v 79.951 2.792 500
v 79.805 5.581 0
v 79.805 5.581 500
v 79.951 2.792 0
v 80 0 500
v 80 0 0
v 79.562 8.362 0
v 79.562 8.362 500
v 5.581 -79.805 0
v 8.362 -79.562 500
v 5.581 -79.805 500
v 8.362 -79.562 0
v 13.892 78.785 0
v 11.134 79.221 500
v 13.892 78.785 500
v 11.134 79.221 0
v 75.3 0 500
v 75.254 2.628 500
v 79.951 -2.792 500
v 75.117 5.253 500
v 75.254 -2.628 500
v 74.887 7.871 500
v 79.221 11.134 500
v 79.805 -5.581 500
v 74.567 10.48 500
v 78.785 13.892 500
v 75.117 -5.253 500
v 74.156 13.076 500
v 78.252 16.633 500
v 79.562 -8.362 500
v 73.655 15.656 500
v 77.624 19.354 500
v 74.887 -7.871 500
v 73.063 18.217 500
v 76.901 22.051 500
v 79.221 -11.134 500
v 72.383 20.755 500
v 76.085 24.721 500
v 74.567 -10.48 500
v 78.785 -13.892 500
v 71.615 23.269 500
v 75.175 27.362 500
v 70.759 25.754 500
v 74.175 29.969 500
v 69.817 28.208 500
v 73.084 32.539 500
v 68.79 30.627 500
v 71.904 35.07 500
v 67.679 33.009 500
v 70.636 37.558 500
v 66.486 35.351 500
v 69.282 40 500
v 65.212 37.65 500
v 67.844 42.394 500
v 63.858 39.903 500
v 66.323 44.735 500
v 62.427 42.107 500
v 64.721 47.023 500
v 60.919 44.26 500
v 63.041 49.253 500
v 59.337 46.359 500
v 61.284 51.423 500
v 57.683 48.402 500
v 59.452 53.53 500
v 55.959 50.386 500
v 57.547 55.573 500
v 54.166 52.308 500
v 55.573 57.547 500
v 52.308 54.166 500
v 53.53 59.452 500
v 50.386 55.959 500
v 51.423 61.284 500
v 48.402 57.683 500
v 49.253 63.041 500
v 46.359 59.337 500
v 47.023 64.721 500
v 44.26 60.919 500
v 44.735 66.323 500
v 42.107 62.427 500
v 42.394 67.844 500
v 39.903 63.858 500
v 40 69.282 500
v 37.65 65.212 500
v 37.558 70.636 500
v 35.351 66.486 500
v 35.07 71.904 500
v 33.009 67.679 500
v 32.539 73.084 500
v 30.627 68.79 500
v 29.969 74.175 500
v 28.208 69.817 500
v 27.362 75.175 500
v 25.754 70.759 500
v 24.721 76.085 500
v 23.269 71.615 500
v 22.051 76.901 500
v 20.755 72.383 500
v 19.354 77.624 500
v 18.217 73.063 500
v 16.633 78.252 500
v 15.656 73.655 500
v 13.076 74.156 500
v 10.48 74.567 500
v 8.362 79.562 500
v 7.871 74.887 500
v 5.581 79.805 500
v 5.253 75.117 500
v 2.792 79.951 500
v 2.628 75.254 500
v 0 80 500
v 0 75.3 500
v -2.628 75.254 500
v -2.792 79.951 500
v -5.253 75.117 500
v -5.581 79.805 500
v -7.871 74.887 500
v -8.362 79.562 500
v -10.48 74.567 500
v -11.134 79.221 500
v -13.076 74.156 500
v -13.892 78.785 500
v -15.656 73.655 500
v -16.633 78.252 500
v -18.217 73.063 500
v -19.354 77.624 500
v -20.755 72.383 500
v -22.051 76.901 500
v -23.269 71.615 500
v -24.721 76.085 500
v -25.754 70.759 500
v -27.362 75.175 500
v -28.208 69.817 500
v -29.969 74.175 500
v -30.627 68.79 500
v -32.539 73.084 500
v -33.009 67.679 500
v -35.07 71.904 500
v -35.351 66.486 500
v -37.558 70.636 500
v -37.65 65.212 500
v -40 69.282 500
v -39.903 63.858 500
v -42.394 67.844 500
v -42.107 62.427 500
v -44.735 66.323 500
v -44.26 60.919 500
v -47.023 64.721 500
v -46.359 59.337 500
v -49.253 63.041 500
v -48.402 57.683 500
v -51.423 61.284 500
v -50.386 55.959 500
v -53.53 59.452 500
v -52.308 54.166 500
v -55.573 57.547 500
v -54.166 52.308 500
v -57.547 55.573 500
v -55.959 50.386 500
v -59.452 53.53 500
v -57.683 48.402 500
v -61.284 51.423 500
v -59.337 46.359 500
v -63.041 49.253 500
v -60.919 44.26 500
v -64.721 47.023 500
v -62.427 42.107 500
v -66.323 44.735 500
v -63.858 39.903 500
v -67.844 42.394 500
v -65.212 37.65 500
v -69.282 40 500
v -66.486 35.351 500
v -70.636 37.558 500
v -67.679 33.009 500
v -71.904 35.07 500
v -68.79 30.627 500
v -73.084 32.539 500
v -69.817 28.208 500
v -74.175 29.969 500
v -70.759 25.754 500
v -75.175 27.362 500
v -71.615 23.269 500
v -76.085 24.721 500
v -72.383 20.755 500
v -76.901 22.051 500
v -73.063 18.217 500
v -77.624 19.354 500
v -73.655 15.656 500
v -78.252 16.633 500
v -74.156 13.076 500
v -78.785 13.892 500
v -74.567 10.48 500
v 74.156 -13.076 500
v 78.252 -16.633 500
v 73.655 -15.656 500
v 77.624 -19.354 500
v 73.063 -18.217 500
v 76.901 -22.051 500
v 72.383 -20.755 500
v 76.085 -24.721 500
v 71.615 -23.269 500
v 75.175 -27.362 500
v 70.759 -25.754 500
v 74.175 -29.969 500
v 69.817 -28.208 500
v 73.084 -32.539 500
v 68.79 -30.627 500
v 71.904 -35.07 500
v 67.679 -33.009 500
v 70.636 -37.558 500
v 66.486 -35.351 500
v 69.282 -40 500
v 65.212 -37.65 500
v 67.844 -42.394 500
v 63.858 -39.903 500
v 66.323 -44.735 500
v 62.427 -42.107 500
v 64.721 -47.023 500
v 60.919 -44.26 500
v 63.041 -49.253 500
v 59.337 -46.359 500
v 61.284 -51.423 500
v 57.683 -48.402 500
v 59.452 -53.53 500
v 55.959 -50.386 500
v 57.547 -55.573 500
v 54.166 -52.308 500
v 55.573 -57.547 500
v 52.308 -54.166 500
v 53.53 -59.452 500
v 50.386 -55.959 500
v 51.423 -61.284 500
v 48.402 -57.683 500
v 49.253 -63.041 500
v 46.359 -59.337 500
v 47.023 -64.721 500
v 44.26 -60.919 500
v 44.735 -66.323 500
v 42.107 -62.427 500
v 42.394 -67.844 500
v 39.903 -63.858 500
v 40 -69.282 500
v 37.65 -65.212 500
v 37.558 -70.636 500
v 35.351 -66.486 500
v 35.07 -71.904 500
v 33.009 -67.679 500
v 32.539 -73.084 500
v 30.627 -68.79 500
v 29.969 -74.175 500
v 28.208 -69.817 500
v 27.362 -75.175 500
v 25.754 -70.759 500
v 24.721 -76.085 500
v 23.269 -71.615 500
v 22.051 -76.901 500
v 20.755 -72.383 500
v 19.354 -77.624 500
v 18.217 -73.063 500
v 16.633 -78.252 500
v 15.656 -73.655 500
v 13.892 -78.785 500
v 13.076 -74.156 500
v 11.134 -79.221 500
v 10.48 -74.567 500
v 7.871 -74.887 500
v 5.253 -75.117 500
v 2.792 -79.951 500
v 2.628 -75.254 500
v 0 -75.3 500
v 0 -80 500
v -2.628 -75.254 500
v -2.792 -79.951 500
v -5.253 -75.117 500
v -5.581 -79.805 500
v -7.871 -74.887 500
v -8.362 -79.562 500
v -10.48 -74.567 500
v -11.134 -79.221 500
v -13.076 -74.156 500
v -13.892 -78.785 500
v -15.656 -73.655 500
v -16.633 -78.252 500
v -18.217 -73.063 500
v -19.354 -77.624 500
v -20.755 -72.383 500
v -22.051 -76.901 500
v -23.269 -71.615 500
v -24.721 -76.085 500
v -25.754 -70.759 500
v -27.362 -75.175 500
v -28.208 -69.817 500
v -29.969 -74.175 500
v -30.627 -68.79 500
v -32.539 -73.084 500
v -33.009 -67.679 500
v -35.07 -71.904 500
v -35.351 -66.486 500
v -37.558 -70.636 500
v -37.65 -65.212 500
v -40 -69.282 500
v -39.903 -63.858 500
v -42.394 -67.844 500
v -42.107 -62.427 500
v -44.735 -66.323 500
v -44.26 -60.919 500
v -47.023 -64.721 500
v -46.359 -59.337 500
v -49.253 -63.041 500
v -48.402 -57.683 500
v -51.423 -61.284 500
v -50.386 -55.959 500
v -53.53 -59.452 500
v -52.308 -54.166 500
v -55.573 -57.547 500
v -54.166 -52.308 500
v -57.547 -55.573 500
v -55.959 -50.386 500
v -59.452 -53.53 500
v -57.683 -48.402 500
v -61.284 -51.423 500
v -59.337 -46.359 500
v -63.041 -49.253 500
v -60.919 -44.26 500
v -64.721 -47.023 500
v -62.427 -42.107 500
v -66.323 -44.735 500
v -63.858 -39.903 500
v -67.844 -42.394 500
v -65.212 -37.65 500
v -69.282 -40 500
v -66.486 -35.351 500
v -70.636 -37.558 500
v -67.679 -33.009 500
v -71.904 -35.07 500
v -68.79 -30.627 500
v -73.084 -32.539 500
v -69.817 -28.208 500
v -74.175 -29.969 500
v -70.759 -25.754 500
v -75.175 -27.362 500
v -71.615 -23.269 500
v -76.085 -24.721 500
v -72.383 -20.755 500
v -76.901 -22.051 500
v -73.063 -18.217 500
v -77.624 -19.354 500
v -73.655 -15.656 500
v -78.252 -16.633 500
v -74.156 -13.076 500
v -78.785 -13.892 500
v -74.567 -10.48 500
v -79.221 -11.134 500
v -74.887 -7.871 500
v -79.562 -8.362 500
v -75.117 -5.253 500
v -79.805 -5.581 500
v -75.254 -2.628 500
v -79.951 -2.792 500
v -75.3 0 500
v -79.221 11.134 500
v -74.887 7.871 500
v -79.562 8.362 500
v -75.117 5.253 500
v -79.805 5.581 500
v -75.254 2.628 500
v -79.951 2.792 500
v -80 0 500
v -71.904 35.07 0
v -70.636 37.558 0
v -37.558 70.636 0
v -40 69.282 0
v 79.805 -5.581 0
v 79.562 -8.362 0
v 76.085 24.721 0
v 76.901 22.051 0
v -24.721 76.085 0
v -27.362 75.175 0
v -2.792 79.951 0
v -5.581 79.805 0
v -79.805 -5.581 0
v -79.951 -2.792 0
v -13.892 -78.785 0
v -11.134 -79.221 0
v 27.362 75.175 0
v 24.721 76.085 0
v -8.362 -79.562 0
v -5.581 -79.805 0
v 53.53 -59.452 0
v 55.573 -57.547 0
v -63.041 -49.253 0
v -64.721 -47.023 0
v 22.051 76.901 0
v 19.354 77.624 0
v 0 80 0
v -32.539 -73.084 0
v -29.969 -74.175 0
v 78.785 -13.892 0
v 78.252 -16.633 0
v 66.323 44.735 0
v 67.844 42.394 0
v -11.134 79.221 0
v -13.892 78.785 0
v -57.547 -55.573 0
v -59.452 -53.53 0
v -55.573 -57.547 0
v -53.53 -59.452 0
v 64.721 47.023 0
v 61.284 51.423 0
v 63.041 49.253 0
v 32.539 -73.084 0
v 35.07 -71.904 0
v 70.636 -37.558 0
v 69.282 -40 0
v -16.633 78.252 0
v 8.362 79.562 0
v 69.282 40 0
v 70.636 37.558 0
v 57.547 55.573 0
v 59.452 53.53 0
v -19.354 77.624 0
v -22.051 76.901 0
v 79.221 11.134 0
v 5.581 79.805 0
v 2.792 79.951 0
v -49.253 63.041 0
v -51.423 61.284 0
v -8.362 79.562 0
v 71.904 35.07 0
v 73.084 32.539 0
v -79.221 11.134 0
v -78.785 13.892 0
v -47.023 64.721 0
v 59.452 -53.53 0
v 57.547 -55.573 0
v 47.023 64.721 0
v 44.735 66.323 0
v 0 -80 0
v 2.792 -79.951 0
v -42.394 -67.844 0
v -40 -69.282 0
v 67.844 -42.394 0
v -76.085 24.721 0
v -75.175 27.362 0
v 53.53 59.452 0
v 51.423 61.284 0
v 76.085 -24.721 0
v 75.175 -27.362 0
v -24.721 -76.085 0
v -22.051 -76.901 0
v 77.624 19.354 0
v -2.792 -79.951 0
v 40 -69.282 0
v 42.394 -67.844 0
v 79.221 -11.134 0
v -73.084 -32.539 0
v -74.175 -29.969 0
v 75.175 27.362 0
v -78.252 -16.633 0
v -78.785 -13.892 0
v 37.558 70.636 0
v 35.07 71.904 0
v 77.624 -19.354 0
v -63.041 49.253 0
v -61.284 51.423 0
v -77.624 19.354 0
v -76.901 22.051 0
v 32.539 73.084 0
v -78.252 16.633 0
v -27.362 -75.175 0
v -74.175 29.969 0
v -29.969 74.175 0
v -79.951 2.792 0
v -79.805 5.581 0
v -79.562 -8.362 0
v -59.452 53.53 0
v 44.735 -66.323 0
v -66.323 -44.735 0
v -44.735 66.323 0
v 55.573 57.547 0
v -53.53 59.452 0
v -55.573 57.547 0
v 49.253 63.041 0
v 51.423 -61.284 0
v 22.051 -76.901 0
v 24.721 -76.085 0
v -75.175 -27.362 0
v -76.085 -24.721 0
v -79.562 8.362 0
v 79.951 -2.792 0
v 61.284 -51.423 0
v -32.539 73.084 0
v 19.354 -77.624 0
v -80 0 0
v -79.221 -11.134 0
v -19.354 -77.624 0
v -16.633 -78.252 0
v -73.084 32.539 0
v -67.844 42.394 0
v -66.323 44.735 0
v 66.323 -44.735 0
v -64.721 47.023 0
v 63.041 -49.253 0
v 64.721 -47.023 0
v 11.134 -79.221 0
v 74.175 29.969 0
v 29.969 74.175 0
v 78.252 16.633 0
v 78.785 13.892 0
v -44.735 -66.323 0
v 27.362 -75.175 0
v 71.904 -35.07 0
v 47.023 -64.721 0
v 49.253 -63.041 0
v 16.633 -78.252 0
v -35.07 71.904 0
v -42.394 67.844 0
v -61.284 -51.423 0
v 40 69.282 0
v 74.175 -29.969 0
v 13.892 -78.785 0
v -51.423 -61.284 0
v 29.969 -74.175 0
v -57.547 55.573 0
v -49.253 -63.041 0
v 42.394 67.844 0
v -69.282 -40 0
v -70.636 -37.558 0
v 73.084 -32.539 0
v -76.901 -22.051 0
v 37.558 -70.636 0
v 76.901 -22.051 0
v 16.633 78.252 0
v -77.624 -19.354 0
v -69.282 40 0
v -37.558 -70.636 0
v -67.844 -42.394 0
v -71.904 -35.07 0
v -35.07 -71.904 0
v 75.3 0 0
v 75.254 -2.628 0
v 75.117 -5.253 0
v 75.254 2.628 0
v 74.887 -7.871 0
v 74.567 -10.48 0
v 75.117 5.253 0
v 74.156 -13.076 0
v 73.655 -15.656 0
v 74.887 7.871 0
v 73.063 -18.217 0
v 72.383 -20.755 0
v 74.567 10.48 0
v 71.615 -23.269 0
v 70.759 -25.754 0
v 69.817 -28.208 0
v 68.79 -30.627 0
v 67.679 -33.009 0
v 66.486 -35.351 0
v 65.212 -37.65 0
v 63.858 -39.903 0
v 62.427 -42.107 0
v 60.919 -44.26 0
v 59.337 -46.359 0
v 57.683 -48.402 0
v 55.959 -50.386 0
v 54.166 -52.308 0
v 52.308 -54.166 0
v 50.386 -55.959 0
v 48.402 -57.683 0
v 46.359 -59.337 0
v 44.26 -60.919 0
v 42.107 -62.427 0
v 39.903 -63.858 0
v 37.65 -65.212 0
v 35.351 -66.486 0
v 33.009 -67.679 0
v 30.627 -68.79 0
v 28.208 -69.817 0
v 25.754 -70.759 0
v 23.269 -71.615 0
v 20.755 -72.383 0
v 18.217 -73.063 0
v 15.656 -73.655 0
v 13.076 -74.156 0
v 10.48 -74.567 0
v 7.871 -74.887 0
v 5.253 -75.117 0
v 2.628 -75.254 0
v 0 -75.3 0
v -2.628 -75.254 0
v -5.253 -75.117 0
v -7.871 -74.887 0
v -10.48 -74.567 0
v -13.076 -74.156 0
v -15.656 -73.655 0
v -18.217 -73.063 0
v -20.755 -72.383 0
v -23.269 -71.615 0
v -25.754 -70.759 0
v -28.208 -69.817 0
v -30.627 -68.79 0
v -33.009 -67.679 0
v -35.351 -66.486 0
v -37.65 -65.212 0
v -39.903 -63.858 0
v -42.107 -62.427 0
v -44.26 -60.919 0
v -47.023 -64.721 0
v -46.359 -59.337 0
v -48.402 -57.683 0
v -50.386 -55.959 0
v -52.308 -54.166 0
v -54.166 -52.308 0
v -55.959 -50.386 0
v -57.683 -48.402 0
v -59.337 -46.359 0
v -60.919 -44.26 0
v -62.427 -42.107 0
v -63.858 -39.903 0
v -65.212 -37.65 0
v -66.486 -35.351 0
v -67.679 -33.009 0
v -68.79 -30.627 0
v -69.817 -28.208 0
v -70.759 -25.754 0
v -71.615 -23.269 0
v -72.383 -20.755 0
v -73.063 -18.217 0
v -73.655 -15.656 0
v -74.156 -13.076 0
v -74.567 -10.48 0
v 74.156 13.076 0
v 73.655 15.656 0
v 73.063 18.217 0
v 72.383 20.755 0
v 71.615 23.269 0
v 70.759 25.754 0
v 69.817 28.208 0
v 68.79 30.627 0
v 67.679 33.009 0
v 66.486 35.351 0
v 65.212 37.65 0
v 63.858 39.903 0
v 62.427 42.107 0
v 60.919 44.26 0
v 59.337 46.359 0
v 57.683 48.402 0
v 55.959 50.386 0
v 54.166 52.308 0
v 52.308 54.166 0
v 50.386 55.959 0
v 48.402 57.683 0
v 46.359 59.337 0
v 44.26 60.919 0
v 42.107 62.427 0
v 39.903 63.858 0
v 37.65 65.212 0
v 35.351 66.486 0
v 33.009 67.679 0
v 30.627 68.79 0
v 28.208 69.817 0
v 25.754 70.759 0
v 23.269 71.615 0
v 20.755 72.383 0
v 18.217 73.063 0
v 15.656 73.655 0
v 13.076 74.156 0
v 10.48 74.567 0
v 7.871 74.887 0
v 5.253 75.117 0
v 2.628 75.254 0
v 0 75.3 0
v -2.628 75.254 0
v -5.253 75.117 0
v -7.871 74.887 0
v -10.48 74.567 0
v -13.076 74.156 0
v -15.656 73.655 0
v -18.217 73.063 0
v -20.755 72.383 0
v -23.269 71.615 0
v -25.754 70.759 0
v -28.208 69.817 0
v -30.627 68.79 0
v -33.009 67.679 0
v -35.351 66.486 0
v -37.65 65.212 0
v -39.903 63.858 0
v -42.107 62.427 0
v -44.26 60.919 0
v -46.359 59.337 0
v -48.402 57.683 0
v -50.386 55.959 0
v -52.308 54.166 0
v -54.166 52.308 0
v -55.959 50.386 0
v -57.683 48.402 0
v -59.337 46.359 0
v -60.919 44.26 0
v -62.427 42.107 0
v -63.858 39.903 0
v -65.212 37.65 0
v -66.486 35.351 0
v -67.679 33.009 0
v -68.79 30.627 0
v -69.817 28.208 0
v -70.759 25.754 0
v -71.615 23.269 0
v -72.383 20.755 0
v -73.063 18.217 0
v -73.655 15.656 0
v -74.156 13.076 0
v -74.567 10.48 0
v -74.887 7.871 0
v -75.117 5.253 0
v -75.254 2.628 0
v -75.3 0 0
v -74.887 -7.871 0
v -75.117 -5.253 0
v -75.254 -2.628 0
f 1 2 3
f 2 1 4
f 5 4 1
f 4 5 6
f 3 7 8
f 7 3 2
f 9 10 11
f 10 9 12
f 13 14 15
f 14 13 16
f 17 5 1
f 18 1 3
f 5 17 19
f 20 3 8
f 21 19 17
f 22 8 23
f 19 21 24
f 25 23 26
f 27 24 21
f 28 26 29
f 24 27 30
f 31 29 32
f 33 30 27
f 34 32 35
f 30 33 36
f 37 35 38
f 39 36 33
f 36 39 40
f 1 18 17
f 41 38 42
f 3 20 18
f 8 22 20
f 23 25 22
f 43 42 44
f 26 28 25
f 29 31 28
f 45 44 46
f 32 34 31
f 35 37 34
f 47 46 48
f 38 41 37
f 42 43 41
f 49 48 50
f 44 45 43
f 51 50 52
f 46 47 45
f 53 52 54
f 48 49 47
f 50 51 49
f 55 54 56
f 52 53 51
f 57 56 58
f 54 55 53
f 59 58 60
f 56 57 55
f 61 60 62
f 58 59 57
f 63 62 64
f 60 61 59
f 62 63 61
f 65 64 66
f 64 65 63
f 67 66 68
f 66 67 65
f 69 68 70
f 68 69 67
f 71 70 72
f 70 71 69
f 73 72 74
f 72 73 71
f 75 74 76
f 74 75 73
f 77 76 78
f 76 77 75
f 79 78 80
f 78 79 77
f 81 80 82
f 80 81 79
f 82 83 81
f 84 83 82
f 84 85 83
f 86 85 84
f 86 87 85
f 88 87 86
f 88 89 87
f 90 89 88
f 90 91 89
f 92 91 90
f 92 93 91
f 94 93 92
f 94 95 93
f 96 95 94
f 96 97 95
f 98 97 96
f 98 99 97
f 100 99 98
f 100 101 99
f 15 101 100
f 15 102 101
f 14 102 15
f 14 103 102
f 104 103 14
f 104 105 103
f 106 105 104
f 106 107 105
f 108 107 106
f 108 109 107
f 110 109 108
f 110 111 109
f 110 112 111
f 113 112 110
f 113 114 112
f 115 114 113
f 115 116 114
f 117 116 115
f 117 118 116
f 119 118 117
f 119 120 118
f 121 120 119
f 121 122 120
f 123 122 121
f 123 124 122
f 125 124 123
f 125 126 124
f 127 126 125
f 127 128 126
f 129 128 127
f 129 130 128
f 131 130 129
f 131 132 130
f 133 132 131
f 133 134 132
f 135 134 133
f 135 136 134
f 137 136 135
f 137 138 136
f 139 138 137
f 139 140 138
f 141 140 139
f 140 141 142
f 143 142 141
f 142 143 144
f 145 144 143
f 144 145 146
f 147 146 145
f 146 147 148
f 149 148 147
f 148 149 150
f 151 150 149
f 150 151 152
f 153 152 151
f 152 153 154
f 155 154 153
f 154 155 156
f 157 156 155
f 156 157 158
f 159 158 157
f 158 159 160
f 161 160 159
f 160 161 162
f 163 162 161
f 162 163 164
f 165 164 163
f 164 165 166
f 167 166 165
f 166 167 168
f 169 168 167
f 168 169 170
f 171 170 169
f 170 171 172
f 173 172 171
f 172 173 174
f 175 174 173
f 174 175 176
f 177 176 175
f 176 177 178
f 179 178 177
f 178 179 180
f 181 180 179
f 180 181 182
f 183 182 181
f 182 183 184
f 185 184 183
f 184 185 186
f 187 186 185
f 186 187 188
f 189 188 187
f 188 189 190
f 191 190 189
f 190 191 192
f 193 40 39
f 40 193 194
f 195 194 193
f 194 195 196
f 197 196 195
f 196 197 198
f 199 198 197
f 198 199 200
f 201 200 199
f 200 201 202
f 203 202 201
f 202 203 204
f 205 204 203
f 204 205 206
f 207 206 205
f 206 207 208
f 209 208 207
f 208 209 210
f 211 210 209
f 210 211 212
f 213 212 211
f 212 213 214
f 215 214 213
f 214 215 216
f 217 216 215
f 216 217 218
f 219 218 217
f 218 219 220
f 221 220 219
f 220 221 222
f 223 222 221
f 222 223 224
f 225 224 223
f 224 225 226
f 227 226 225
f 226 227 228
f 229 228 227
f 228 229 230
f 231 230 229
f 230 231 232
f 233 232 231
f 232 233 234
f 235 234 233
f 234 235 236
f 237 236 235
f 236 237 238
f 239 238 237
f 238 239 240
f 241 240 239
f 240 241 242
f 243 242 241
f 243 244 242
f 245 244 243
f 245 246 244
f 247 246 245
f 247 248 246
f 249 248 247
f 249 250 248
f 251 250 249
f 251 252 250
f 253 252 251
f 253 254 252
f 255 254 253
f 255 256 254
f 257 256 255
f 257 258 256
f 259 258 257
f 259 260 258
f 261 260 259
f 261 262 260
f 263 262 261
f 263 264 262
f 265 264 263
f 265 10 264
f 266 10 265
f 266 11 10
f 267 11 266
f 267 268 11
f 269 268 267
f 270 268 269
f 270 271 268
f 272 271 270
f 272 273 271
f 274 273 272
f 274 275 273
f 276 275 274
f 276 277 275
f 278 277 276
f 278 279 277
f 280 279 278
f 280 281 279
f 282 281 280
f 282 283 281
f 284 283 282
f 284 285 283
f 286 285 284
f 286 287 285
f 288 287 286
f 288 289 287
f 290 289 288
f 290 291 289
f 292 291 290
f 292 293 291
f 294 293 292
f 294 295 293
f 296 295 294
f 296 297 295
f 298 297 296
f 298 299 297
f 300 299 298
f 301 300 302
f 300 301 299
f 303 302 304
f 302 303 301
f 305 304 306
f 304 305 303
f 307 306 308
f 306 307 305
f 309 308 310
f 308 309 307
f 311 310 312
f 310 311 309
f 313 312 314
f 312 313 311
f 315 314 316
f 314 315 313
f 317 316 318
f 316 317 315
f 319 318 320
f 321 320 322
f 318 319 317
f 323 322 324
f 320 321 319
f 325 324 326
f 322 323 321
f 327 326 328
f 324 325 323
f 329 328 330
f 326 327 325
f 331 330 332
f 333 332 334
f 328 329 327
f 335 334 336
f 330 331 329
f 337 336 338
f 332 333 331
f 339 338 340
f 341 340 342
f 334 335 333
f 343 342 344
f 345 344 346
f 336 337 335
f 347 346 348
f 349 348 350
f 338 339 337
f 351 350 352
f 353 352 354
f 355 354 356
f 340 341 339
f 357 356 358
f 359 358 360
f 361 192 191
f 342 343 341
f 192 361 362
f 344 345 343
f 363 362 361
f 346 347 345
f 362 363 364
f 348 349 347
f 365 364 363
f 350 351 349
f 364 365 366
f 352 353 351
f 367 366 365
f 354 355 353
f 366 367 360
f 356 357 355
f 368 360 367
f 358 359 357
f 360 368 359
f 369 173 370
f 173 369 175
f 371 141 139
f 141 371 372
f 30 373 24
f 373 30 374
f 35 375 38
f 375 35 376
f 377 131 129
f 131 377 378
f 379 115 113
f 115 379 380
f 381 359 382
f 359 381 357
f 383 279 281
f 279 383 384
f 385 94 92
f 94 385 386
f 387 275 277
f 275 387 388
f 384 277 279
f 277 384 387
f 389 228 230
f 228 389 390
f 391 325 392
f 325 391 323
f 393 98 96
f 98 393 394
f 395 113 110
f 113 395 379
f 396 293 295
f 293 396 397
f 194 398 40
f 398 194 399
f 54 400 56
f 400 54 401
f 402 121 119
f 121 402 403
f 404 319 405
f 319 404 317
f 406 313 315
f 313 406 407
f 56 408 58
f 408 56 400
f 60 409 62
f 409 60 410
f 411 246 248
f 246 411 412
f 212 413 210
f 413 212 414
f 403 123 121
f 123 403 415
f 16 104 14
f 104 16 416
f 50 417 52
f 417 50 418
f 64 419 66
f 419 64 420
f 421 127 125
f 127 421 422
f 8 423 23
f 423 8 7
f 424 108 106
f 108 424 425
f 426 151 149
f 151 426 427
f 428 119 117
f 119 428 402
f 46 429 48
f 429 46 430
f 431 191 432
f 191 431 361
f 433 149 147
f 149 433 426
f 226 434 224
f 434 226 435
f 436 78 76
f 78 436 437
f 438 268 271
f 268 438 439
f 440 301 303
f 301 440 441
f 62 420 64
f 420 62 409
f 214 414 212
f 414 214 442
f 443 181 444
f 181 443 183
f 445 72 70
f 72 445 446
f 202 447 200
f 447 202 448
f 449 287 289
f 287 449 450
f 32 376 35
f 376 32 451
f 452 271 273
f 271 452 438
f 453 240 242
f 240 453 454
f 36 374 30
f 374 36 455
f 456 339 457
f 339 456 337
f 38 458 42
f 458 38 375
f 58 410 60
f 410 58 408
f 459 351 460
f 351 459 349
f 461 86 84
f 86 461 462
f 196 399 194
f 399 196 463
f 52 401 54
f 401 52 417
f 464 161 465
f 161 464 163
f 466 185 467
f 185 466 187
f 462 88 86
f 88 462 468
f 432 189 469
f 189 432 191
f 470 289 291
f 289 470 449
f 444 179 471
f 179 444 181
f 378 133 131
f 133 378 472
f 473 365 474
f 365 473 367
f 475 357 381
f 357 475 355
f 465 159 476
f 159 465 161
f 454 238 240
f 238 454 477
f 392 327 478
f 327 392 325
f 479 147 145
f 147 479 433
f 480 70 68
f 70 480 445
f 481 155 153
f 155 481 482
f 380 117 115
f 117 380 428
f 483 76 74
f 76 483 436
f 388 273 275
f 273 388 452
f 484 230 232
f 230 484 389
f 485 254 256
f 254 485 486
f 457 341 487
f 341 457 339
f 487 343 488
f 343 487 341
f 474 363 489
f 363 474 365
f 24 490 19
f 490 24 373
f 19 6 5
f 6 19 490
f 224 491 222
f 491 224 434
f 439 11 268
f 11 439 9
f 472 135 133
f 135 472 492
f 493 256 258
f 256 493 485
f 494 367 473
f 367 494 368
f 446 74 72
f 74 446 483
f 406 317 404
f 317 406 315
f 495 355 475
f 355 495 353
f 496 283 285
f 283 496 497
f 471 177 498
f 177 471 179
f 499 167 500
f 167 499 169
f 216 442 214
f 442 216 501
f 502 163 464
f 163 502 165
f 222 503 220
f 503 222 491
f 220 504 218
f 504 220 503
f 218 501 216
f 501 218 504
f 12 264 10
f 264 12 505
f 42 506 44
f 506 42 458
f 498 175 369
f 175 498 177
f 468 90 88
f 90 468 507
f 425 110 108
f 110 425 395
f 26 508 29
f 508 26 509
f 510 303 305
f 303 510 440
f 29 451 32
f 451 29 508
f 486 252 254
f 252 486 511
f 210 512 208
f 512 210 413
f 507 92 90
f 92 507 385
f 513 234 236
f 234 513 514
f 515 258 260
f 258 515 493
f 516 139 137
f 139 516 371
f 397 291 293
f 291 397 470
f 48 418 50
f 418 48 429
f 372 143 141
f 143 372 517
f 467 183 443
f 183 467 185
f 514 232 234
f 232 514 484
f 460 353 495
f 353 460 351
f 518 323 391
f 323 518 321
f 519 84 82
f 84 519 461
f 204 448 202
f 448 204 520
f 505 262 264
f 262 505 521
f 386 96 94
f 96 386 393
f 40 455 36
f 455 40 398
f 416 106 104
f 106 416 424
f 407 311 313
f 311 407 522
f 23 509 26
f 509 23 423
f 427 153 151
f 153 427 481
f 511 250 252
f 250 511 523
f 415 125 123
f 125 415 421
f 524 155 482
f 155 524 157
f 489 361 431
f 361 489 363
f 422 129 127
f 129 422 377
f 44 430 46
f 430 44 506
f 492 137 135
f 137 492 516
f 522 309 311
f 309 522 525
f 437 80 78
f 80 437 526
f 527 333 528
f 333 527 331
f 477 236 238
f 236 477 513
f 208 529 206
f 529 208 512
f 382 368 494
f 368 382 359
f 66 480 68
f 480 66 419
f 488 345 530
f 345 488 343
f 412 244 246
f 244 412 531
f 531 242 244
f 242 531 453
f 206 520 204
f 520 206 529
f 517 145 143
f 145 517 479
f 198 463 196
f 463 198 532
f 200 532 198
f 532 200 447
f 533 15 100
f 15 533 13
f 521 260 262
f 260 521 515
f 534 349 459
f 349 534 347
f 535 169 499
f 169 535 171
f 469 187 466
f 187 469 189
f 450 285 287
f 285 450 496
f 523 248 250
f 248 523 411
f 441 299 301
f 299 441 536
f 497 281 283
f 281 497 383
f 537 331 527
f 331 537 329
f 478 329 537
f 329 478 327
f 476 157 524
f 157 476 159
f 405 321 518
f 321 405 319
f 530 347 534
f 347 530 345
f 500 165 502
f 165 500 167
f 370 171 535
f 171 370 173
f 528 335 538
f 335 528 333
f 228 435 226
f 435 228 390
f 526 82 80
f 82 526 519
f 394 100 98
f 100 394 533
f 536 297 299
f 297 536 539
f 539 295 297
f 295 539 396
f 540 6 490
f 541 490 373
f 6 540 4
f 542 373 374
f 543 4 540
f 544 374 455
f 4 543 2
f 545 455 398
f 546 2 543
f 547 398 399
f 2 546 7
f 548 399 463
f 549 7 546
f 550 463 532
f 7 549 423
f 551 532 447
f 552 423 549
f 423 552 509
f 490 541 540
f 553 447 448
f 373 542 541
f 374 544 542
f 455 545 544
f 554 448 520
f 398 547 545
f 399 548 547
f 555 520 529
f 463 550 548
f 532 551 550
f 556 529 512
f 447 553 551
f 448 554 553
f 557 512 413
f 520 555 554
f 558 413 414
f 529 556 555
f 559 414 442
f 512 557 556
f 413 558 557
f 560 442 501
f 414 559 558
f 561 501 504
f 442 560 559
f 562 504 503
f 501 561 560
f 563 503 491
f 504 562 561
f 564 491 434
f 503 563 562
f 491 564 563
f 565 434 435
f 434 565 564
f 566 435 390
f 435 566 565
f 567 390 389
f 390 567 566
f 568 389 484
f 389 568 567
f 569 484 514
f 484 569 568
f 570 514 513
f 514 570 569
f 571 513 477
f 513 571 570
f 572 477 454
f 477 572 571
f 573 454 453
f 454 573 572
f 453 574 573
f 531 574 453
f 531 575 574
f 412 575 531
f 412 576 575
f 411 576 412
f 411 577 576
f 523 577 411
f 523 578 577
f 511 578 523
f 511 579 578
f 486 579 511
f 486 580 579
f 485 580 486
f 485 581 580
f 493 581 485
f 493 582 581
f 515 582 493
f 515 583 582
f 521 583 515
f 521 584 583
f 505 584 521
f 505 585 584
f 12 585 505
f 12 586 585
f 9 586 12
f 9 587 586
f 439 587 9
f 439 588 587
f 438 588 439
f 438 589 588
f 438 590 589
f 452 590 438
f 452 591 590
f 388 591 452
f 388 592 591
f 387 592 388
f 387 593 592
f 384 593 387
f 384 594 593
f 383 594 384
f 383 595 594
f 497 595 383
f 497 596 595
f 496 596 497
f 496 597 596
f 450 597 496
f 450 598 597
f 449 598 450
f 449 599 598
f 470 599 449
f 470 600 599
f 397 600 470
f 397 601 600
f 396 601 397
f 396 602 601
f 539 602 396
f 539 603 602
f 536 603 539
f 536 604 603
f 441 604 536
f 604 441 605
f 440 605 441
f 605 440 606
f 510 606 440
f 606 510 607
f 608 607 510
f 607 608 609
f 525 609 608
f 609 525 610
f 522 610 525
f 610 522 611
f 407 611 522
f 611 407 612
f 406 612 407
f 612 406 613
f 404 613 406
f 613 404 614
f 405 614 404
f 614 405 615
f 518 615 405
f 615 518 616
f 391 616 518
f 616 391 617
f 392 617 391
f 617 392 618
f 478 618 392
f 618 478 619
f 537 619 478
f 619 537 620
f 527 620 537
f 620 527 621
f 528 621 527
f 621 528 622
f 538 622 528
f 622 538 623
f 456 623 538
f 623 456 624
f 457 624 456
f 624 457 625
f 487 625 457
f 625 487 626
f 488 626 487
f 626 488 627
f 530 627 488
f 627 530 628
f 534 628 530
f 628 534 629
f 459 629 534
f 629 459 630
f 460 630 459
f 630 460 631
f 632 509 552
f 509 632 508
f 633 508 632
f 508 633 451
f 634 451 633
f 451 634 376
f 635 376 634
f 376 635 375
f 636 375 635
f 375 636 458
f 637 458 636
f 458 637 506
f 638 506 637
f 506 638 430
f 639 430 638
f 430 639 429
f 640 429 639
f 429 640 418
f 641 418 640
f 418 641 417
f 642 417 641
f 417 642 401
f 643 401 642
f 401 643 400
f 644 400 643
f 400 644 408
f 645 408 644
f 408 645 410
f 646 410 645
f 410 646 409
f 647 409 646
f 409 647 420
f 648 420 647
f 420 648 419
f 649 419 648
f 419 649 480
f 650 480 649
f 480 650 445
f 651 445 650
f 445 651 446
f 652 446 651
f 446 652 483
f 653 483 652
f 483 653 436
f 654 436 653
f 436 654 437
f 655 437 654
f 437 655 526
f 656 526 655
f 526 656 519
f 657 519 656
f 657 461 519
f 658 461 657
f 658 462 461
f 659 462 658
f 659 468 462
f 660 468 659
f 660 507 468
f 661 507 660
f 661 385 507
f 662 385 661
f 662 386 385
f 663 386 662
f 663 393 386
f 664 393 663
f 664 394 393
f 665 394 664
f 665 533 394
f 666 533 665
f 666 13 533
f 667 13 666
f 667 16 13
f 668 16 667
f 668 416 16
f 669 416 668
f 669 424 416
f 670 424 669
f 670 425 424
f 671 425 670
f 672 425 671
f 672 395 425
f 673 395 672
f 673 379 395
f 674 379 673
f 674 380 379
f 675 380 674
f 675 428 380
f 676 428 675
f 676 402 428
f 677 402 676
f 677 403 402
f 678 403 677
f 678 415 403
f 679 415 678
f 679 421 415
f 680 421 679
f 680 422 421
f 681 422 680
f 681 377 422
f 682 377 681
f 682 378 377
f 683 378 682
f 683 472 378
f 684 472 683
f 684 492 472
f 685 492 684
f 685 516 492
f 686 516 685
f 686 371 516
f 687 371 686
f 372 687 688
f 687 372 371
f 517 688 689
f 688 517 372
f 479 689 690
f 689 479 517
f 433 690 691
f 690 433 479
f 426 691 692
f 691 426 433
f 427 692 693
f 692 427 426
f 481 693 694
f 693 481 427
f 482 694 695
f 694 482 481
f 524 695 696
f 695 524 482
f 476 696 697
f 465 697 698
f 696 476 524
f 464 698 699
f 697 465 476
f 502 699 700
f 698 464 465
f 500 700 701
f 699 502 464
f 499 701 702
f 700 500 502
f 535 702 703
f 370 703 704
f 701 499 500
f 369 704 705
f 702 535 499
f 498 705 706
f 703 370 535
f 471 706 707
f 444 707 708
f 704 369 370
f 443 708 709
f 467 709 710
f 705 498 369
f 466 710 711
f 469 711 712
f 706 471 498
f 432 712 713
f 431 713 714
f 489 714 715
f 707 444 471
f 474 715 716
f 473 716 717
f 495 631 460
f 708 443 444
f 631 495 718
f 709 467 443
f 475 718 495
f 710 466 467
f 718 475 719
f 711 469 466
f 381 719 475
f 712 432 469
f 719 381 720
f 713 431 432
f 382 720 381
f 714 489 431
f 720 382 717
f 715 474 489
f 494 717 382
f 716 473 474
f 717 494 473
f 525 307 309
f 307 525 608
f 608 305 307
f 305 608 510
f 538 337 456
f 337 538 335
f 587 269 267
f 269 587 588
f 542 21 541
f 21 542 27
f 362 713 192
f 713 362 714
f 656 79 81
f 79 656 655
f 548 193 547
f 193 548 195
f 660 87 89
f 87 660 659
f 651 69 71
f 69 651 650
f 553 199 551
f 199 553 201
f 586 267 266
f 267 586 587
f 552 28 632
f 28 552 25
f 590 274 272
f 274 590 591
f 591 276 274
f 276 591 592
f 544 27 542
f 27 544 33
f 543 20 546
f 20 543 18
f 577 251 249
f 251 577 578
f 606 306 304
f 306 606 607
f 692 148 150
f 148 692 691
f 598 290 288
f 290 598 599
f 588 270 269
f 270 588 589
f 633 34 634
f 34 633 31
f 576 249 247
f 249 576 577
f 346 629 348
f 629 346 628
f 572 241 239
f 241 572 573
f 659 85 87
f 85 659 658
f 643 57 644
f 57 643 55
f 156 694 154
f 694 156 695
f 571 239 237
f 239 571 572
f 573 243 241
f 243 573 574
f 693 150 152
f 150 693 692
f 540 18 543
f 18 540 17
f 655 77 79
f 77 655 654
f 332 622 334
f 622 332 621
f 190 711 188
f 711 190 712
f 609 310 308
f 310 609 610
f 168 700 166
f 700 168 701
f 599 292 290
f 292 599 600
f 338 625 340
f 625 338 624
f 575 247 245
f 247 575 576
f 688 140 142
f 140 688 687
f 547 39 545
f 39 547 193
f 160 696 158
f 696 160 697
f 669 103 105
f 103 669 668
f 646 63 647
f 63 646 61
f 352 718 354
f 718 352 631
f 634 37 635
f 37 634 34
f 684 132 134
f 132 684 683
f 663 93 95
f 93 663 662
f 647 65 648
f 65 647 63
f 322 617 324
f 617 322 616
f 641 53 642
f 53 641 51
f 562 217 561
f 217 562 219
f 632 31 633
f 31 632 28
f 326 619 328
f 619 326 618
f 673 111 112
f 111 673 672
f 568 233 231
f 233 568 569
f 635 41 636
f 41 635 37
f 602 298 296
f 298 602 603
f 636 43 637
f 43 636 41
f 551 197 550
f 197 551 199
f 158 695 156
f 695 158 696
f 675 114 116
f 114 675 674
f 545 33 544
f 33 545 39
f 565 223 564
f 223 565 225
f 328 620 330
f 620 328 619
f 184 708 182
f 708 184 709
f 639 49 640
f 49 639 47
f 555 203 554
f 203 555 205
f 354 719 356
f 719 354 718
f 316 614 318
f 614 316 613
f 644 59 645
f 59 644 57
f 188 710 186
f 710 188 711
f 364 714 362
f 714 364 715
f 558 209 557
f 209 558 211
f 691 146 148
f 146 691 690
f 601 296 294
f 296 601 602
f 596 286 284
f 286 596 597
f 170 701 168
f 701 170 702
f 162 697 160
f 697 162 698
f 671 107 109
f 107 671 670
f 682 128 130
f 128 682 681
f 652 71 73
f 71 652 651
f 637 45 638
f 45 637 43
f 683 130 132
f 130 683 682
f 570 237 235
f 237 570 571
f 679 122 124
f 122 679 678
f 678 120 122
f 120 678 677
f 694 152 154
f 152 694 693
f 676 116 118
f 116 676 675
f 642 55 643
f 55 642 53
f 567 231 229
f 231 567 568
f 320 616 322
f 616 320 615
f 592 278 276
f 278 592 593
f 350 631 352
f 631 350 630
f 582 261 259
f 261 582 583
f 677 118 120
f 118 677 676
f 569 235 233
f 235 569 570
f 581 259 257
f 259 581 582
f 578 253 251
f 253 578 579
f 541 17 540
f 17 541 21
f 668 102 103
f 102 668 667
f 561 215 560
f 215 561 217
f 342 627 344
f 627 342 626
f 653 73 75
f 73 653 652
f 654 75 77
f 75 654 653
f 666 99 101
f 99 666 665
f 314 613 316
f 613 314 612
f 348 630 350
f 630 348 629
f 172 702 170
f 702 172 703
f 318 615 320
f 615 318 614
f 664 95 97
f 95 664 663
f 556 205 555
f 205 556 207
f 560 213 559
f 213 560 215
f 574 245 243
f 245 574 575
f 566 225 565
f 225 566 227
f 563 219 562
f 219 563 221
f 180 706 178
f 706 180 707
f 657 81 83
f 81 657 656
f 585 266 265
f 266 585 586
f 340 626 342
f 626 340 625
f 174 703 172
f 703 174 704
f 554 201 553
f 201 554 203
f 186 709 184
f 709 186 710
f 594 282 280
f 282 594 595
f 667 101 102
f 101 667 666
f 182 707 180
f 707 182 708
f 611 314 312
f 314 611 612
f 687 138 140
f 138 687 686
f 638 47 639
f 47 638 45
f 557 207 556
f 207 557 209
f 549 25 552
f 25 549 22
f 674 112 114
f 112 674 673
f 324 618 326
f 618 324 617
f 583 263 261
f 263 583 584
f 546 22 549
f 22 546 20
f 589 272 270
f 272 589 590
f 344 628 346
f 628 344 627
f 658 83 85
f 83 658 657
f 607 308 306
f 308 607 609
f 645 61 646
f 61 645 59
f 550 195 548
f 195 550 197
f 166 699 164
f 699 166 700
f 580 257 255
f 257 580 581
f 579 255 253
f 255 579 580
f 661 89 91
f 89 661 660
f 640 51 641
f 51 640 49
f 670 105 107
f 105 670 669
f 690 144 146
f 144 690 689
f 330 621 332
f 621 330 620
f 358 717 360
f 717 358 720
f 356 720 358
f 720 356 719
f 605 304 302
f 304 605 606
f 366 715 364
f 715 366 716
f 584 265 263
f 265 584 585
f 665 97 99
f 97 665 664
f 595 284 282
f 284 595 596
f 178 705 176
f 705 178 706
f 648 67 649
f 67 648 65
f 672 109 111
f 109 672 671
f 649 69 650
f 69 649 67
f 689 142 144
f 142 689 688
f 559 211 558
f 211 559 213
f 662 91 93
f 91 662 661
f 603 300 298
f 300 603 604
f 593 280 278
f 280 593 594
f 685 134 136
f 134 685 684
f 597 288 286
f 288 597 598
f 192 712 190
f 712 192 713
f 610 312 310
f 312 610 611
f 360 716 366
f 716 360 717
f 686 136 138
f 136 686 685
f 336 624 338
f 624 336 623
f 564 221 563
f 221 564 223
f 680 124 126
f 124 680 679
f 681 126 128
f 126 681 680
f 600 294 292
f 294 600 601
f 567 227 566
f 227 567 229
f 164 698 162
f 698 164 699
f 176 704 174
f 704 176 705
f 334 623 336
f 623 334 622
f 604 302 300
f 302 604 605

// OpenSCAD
$fn = 180;

// HT pipe parameters (mm)
outer_d = 160;      // nominal HT 160 outer diameter
length  = 500;      // pipe length
wall    = 4.7;      // typical HT 160 wall thickness (approx.)
inner_d = outer_d - 2*wall;

module ht_pipe(od, id, h) {
    difference() {
        cylinder(d=od, h=h, center=false);
        translate([0,0,-0.5])
            cylinder(d=id, h=h+1, center=false);
    }
}

ht_pipe(outer_d, inner_d, length);
